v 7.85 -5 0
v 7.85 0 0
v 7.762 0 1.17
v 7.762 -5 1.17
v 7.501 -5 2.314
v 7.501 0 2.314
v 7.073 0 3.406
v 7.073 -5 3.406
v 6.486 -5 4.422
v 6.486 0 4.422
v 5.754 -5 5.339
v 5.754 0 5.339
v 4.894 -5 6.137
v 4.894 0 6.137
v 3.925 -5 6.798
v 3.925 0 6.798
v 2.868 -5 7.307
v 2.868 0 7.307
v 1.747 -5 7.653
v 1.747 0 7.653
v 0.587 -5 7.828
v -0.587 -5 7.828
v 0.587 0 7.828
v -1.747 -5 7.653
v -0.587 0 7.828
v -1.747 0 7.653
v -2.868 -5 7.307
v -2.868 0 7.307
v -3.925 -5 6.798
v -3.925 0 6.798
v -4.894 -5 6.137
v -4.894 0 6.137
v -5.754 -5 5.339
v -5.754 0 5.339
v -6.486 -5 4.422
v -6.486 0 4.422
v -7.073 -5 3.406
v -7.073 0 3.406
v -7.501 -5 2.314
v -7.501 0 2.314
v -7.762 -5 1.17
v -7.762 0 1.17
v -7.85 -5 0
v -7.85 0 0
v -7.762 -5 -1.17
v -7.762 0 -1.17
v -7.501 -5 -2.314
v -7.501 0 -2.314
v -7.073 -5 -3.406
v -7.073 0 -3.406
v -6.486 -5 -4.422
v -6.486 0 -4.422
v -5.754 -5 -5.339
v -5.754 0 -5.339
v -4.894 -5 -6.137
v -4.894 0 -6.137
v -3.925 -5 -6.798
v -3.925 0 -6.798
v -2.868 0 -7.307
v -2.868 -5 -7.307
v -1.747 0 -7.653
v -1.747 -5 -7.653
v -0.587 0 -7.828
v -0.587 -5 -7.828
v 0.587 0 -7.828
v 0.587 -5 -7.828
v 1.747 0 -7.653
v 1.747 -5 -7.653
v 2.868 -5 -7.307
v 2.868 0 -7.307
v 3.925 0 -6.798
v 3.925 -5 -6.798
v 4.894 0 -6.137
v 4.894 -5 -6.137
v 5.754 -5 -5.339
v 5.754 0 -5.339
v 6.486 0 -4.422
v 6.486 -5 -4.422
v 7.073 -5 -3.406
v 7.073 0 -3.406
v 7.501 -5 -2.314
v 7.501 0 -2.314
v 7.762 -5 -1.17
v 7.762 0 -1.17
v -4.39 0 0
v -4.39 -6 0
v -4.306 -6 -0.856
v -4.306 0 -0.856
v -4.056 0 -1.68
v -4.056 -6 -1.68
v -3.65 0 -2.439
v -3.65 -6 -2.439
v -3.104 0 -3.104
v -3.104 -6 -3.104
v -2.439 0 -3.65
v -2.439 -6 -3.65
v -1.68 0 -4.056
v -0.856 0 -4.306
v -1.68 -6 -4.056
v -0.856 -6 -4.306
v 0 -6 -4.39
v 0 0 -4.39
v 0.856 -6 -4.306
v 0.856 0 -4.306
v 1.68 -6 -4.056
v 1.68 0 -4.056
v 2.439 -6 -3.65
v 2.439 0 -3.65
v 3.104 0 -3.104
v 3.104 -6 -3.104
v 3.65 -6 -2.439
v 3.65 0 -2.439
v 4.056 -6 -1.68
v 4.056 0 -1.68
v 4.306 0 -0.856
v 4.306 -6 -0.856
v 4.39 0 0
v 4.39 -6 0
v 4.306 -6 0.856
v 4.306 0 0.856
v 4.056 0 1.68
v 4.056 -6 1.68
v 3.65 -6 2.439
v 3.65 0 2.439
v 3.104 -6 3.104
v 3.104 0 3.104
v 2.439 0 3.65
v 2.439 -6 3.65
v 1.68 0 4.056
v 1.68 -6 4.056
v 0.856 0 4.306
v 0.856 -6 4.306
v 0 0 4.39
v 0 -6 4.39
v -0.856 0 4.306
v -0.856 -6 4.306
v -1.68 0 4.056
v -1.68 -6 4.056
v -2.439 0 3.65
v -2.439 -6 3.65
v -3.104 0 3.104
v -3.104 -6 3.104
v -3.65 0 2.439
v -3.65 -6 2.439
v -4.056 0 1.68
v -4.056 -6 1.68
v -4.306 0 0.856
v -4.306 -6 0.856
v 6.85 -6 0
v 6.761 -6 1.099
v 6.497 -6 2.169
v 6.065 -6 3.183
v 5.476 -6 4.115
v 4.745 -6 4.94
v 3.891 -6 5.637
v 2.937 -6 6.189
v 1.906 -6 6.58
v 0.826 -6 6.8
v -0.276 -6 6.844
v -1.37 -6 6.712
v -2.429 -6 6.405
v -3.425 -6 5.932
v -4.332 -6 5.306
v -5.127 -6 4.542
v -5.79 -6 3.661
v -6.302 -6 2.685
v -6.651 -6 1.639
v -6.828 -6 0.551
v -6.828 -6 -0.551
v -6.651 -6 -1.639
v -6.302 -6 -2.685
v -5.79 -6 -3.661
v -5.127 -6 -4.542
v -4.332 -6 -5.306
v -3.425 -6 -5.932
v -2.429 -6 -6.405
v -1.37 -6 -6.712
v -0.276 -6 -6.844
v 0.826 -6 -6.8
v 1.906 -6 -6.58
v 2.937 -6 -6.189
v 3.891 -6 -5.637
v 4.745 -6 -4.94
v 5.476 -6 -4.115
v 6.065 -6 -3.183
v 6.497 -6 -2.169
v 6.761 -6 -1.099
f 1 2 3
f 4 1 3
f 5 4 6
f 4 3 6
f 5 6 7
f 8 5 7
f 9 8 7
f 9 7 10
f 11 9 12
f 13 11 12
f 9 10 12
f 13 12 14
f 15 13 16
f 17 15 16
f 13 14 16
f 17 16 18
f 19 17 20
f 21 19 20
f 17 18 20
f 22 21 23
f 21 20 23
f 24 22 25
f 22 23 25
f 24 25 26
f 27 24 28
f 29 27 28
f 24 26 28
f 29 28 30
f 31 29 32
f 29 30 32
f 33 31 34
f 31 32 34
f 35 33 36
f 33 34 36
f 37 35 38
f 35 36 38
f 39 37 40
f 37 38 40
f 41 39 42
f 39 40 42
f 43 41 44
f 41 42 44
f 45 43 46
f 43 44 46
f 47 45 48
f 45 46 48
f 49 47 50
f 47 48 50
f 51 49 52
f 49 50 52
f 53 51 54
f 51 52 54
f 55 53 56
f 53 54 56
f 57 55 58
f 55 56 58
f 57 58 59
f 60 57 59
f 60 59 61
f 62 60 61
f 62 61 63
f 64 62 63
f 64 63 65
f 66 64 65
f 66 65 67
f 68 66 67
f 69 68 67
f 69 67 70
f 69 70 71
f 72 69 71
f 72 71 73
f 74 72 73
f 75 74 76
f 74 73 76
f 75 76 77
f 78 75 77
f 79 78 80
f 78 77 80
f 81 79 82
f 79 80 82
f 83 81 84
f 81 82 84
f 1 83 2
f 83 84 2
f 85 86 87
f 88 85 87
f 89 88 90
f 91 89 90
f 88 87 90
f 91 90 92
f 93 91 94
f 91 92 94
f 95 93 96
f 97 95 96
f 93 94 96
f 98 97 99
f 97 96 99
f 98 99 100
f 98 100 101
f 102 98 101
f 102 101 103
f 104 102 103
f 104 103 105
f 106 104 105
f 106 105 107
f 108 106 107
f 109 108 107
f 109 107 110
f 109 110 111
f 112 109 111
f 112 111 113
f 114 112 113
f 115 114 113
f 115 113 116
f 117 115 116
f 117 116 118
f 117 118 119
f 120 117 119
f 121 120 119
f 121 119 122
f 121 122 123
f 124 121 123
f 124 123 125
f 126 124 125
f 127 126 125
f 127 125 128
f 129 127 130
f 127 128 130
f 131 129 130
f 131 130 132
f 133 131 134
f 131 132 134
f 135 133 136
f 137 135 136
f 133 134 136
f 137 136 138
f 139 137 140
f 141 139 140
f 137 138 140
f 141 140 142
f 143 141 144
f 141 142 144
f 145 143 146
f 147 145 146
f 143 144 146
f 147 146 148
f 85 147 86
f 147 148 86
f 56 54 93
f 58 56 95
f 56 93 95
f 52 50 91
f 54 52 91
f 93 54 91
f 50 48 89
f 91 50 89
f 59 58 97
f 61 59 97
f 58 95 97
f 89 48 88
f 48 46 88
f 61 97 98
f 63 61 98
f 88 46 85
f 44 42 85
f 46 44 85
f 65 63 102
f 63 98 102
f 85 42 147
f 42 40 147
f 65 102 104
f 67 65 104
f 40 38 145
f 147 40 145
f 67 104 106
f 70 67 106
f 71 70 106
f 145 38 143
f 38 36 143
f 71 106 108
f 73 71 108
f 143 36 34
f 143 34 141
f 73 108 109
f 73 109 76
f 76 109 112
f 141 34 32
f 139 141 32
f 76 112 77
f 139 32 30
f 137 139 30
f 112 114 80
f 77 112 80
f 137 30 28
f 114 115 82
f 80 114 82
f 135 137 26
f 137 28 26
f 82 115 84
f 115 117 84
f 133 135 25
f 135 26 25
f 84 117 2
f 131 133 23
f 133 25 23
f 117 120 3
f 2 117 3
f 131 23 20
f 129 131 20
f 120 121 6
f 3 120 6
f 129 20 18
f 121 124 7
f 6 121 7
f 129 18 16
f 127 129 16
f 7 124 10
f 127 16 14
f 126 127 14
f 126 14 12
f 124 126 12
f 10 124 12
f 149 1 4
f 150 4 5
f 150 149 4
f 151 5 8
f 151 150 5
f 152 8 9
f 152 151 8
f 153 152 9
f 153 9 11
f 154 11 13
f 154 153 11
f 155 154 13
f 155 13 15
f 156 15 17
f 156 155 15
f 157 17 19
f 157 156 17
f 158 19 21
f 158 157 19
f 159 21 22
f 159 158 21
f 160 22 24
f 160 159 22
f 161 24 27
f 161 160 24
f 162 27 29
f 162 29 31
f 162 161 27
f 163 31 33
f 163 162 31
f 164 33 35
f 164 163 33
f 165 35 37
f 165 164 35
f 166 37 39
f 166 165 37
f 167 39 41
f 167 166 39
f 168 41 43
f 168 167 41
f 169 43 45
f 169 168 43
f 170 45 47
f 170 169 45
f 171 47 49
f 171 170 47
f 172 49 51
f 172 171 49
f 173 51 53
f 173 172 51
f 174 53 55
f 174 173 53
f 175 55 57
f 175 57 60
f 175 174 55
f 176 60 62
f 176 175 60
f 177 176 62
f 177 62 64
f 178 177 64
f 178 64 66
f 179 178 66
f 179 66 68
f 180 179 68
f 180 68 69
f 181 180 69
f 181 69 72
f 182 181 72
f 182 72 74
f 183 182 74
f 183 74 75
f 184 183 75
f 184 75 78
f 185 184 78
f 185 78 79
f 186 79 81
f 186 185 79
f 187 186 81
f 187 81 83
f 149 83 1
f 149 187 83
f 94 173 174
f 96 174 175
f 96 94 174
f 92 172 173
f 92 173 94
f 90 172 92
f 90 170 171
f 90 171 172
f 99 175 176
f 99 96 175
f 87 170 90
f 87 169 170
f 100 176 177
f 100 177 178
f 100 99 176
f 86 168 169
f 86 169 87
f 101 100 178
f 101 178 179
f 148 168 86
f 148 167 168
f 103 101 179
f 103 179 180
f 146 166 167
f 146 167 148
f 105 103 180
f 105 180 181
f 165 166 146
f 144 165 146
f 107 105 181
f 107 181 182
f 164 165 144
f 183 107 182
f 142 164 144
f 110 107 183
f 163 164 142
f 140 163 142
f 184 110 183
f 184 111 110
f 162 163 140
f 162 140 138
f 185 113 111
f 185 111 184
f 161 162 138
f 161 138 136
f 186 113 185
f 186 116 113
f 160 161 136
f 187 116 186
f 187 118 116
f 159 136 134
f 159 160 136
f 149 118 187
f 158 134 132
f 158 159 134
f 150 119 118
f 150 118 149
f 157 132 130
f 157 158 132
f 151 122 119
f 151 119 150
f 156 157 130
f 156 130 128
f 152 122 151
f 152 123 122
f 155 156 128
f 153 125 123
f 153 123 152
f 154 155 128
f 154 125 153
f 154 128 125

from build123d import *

# Parameters (mm, degrees)
F0_R     = 7.85
F2_DEPTH = 6
F3_D     = 8.78
F4_SIZE  = 1


with BuildPart() as f2:
    # F0 (on Front) → F2 (new body)
    with BuildSketch(Plane.XZ):
        Circle(F0_R)
    extrude(amount=F2_DEPTH)

    # F3 (through all)
    with Locations(Plane(origin=(0, 0, 0), x_dir=(1, 0, 0), z_dir=(0, 1, 0))):
        with Locations((0, 0)):
            Hole(F3_D / 2)

    # F4
    f4_edges = [f2.edges().sort_by_distance(p)[0] for p in [
        (-7.85, -6, 0),
    ]]
    chamfer(f4_edges, length=F4_SIZE)


solid = f2.part
